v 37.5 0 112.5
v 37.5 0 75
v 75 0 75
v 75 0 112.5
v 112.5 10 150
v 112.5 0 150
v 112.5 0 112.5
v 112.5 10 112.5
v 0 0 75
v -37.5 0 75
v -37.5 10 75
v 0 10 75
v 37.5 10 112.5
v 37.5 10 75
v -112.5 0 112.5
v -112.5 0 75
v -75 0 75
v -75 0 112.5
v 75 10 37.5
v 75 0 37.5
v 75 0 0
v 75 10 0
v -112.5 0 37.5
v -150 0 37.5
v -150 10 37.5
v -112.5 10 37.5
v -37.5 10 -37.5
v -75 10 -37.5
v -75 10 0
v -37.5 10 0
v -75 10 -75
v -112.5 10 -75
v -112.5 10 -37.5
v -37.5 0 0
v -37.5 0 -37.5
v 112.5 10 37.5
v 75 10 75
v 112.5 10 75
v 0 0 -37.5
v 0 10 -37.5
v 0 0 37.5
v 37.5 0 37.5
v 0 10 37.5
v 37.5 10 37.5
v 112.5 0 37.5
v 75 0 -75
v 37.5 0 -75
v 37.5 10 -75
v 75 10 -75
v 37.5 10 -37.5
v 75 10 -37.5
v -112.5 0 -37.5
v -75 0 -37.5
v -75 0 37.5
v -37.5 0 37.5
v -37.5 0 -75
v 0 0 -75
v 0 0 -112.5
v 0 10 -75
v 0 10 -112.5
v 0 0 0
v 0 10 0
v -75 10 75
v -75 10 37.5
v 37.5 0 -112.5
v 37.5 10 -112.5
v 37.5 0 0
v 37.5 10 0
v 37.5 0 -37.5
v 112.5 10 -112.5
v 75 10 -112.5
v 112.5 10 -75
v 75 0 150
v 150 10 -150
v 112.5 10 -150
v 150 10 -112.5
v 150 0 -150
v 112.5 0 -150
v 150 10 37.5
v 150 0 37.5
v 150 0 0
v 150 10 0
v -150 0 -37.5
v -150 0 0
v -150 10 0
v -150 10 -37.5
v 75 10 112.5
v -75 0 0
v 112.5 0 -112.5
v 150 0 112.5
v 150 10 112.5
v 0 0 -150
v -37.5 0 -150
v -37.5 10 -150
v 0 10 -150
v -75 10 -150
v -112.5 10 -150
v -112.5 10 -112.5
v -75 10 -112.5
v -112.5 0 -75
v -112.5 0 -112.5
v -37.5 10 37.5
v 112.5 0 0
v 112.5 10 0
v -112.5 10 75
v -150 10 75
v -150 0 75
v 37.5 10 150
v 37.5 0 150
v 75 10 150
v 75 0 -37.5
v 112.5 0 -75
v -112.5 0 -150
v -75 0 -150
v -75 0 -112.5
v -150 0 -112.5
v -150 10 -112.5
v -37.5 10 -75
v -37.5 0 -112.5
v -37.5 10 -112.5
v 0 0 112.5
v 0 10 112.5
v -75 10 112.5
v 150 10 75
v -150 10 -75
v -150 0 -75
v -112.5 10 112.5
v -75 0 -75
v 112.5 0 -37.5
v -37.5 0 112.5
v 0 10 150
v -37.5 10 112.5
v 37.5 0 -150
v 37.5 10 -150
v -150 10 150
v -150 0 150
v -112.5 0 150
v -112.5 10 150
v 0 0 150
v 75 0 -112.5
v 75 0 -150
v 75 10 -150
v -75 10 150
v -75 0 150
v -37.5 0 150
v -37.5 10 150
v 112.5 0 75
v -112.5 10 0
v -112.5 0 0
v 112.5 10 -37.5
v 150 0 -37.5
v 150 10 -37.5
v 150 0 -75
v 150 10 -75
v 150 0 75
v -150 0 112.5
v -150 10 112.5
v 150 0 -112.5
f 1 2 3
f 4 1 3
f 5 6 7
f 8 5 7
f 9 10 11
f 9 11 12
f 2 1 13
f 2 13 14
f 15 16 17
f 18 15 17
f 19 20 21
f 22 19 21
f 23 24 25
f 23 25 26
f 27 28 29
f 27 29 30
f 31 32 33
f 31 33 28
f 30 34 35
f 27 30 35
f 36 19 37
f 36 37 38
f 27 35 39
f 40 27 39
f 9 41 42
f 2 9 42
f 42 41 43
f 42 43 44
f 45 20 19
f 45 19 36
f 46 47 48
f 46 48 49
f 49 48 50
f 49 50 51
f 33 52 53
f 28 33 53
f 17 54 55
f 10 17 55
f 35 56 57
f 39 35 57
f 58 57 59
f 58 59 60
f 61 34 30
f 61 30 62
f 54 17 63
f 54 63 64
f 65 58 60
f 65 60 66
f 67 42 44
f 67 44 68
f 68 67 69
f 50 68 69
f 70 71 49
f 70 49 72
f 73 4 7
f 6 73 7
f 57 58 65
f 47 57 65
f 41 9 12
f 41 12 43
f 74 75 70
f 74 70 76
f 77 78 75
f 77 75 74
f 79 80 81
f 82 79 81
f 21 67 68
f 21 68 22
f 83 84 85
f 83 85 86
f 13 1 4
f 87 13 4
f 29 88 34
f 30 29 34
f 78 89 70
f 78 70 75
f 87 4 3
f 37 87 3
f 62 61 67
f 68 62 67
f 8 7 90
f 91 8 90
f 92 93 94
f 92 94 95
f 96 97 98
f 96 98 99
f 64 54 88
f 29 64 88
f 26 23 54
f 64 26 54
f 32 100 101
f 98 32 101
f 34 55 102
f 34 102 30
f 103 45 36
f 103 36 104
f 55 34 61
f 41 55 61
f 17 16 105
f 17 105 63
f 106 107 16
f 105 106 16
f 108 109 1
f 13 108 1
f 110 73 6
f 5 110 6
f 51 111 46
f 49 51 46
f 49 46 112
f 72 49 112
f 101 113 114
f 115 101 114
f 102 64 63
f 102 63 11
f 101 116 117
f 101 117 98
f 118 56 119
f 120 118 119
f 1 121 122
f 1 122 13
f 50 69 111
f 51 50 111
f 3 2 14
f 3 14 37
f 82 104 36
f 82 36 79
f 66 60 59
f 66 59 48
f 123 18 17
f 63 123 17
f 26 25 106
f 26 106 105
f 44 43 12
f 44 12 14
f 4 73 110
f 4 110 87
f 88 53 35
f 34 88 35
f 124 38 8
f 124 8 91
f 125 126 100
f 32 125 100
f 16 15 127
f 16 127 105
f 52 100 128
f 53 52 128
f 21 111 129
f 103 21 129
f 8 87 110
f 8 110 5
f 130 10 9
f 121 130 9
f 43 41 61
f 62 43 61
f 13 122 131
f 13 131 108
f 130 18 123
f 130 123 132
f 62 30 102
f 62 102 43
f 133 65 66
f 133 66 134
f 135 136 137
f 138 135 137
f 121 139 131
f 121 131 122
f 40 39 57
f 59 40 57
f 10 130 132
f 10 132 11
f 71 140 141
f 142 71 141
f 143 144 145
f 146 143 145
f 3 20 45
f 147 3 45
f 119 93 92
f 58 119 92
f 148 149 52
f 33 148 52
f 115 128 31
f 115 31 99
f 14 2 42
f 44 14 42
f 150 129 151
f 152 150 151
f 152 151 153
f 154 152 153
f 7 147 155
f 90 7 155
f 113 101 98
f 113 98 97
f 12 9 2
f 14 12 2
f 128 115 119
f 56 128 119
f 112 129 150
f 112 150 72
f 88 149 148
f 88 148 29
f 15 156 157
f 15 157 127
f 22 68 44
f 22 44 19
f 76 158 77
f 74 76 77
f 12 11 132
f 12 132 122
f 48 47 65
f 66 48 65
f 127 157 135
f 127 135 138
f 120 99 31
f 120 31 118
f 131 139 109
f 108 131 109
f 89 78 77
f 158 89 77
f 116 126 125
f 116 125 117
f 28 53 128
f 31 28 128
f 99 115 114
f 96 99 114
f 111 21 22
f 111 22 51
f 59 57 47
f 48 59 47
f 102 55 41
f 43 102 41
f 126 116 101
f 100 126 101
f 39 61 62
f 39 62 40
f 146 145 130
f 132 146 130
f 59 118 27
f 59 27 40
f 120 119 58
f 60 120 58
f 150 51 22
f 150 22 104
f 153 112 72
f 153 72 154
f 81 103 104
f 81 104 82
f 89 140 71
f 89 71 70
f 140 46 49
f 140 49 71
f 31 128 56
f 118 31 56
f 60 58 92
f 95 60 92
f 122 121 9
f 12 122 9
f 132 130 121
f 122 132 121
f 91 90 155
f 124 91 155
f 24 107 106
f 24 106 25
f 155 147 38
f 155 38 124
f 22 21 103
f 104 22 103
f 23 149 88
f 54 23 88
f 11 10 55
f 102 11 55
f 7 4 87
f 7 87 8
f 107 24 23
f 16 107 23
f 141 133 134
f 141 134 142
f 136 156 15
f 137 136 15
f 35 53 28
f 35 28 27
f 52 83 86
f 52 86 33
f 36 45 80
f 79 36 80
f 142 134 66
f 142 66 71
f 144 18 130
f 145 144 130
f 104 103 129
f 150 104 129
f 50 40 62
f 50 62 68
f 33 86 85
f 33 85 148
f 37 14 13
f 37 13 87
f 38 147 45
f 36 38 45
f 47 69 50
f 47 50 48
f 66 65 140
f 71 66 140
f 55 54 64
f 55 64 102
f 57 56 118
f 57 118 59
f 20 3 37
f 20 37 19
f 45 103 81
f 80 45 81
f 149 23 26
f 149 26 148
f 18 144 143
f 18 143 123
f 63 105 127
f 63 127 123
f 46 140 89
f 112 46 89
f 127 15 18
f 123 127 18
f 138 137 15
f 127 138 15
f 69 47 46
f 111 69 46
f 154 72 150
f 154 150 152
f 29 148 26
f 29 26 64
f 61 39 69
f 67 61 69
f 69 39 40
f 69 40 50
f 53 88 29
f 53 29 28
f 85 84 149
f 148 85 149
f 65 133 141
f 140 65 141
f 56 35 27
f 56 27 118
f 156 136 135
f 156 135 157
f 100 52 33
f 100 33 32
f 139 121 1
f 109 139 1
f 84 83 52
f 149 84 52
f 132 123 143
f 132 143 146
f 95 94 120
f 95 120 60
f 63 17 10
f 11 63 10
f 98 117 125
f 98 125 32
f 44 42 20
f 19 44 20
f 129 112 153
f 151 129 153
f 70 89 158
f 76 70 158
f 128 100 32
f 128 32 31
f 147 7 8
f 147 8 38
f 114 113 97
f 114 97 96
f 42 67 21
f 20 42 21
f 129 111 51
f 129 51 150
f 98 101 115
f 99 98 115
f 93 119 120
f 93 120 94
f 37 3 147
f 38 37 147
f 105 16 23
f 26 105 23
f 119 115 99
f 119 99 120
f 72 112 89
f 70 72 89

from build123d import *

# Parameters (mm, degrees)
SKETCH1_W              = 37.5
SKETCH1_H              = 37.5
BOSS_EXTRUDE1_DEPTH    = 10
BOSS_EXTRUDE1_2_DEPTH  = 10
BOSS_EXTRUDE1_3_DEPTH  = 10
BOSS_EXTRUDE1_4_DEPTH  = 10
BOSS_EXTRUDE1_5_DEPTH  = 10
BOSS_EXTRUDE1_6_DEPTH  = 10
BOSS_EXTRUDE1_7_DEPTH  = 10
BOSS_EXTRUDE1_8_DEPTH  = 10
BOSS_EXTRUDE1_9_DEPTH  = 10
BOSS_EXTRUDE1_10_DEPTH = 10
BOSS_EXTRUDE1_11_DEPTH = 10
BOSS_EXTRUDE1_12_DEPTH = 10
BOSS_EXTRUDE1_13_DEPTH = 10
BOSS_EXTRUDE1_14_DEPTH = 10
BOSS_EXTRUDE1_15_DEPTH = 10
BOSS_EXTRUDE1_16_DEPTH = 10
BOSS_EXTRUDE1_17_DEPTH = 10
BOSS_EXTRUDE1_18_DEPTH = 10
BOSS_EXTRUDE1_19_DEPTH = 10
BOSS_EXTRUDE1_20_DEPTH = 10
BOSS_EXTRUDE1_21_DEPTH = 10
BOSS_EXTRUDE1_22_DEPTH = 10
BOSS_EXTRUDE1_23_DEPTH = 10
BOSS_EXTRUDE1_24_DEPTH = 10
BOSS_EXTRUDE1_25_DEPTH = 10
BOSS_EXTRUDE1_26_DEPTH = 10
BOSS_EXTRUDE1_27_DEPTH = 10
BOSS_EXTRUDE1_28_DEPTH = 10
BOSS_EXTRUDE1_29_DEPTH = 10
BOSS_EXTRUDE1_30_DEPTH = 10
BOSS_EXTRUDE1_31_DEPTH = 10
BOSS_EXTRUDE1_32_DEPTH = 10


with BuildPart() as part:
    # Sketch1 → Boss-Extrude1 (new body)
    with BuildSketch(Plane(origin=(0, 0, 0), x_dir=(1, 0, 0), z_dir=(0, 1, 0))):
        with Locations((-131.25, -131.25)):
            Rectangle(SKETCH1_W, SKETCH1_H)
    extrude(amount=BOSS_EXTRUDE1_DEPTH)


with BuildPart() as body_2:
    # Sketch1 → Boss-Extrude1 2 (new body)
    with BuildSketch(Plane(origin=(0, 0, 0), x_dir=(1, 0, 0), z_dir=(0, 1, 0))):
        with Locations((-56.25, -131.25)):
            Rectangle(SKETCH1_W, SKETCH1_H)
    extrude(amount=BOSS_EXTRUDE1_2_DEPTH)


with BuildPart() as body_3:
    # Sketch1 → Boss-Extrude1 3 (new body)
    with BuildSketch(Plane(origin=(0, 0, 0), x_dir=(1, 0, 0), z_dir=(0, 1, 0))):
        with Locations((18.75, -131.25)):
            Rectangle(SKETCH1_W, SKETCH1_H)
    extrude(amount=BOSS_EXTRUDE1_3_DEPTH)


with BuildPart() as body_4:
    # Sketch1 → Boss-Extrude1 4 (new body)
    with BuildSketch(Plane(origin=(0, 0, 0), x_dir=(1, 0, 0), z_dir=(0, 1, 0))):
        with Locations((93.75, -131.25)):
            Rectangle(SKETCH1_W, SKETCH1_H)
    extrude(amount=BOSS_EXTRUDE1_4_DEPTH)


with BuildPart() as body_5:
    # Sketch1 → Boss-Extrude1 5 (new body)
    with BuildSketch(Plane(origin=(0, 0, 0), x_dir=(1, 0, 0), z_dir=(0, 1, 0))):
        with Locations((131.25, -93.75)):
            Rectangle(SKETCH1_W, SKETCH1_H)
    extrude(amount=BOSS_EXTRUDE1_5_DEPTH)


with BuildPart() as body_6:
    # Sketch1 → Boss-Extrude1 6 (new body)
    with BuildSketch(Plane(origin=(0, 0, 0), x_dir=(1, 0, 0), z_dir=(0, 1, 0))):
        with Locations((131.25, -18.75)):
            Rectangle(SKETCH1_W, SKETCH1_H)
    extrude(amount=BOSS_EXTRUDE1_6_DEPTH)


with BuildPart() as body_7:
    # Sketch1 → Boss-Extrude1 7 (new body)
    with BuildSketch(Plane(origin=(0, 0, 0), x_dir=(1, 0, 0), z_dir=(0, 1, 0))):
        with Locations((131.25, 56.25)):
            Rectangle(SKETCH1_W, SKETCH1_H)
    extrude(amount=BOSS_EXTRUDE1_7_DEPTH)


with BuildPart() as body_8:
    # Sketch1 → Boss-Extrude1 8 (new body)
    with BuildSketch(Plane(origin=(0, 0, 0), x_dir=(1, 0, 0), z_dir=(0, 1, 0))):
        with Locations((131.25, 131.25)):
            Rectangle(SKETCH1_W, SKETCH1_H)
    extrude(amount=BOSS_EXTRUDE1_8_DEPTH)


with BuildPart() as body_9:
    # Sketch1 → Boss-Extrude1 9 (new body)
    with BuildSketch(Plane(origin=(0, 0, 0), x_dir=(1, 0, 0), z_dir=(0, 1, 0))):
        with Locations((93.75, 93.75)):
            Rectangle(SKETCH1_W, SKETCH1_H)
    extrude(amount=BOSS_EXTRUDE1_9_DEPTH)


with BuildPart() as body_10:
    # Sketch1 → Boss-Extrude1 10 (new body)
    with BuildSketch(Plane(origin=(0, 0, 0), x_dir=(1, 0, 0), z_dir=(0, 1, 0))):
        with Locations((93.75, 18.75)):
            Rectangle(SKETCH1_W, SKETCH1_H)
    extrude(amount=BOSS_EXTRUDE1_10_DEPTH)


with BuildPart() as body_11:
    # Sketch1 → Boss-Extrude1 11 (new body)
    with BuildSketch(Plane(origin=(0, 0, 0), x_dir=(1, 0, 0), z_dir=(0, 1, 0))):
        with Locations((93.75, -56.25)):
            Rectangle(SKETCH1_W, SKETCH1_H)
    extrude(amount=BOSS_EXTRUDE1_11_DEPTH)


with BuildPart() as body_12:
    # Sketch1 → Boss-Extrude1 12 (new body)
    with BuildSketch(Plane(origin=(0, 0, 0), x_dir=(1, 0, 0), z_dir=(0, 1, 0))):
        with Locations((56.25, -93.75)):
            Rectangle(SKETCH1_W, SKETCH1_H)
    extrude(amount=BOSS_EXTRUDE1_12_DEPTH)


with BuildPart() as body_13:
    # Sketch1 → Boss-Extrude1 13 (new body)
    with BuildSketch(Plane(origin=(0, 0, 0), x_dir=(1, 0, 0), z_dir=(0, 1, 0))):
        with Locations((56.25, -18.75)):
            Rectangle(SKETCH1_W, SKETCH1_H)
    extrude(amount=BOSS_EXTRUDE1_13_DEPTH)


with BuildPart() as body_14:
    # Sketch1 → Boss-Extrude1 14 (new body)
    with BuildSketch(Plane(origin=(0, 0, 0), x_dir=(1, 0, 0), z_dir=(0, 1, 0))):
        with Locations((56.25, 56.25)):
            Rectangle(SKETCH1_W, SKETCH1_H)
    extrude(amount=BOSS_EXTRUDE1_14_DEPTH)


with BuildPart() as body_15:
    # Sketch1 → Boss-Extrude1 15 (new body)
    with BuildSketch(Plane(origin=(0, 0, 0), x_dir=(1, 0, 0), z_dir=(0, 1, 0))):
        with Locations((56.25, 131.25)):
            Rectangle(SKETCH1_W, SKETCH1_H)
    extrude(amount=BOSS_EXTRUDE1_15_DEPTH)


with BuildPart() as body_16:
    # Sketch1 → Boss-Extrude1 16 (new body)
    with BuildSketch(Plane(origin=(0, 0, 0), x_dir=(1, 0, 0), z_dir=(0, 1, 0))):
        with Locations((18.75, 93.75)):
            Rectangle(SKETCH1_W, SKETCH1_H)
    extrude(amount=BOSS_EXTRUDE1_16_DEPTH)


with BuildPart() as body_17:
    # Sketch1 → Boss-Extrude1 17 (new body)
    with BuildSketch(Plane(origin=(0, 0, 0), x_dir=(1, 0, 0), z_dir=(0, 1, 0))):
        with Locations((18.75, 18.75)):
            Rectangle(SKETCH1_W, SKETCH1_H)
    extrude(amount=BOSS_EXTRUDE1_17_DEPTH)


with BuildPart() as body_18:
    # Sketch1 → Boss-Extrude1 18 (new body)
    with BuildSketch(Plane(origin=(0, 0, 0), x_dir=(1, 0, 0), z_dir=(0, 1, 0))):
        with Locations((18.75, -56.25)):
            Rectangle(SKETCH1_W, SKETCH1_H)
    extrude(amount=BOSS_EXTRUDE1_18_DEPTH)


with BuildPart() as body_19:
    # Sketch1 → Boss-Extrude1 19 (new body)
    with BuildSketch(Plane(origin=(0, 0, 0), x_dir=(1, 0, 0), z_dir=(0, 1, 0))):
        with Locations((-18.75, -93.75)):
            Rectangle(SKETCH1_W, SKETCH1_H)
    extrude(amount=BOSS_EXTRUDE1_19_DEPTH)


with BuildPart() as body_20:
    # Sketch1 → Boss-Extrude1 20 (new body)
    with BuildSketch(Plane(origin=(0, 0, 0), x_dir=(1, 0, 0), z_dir=(0, 1, 0))):
        with Locations((-18.75, -18.75)):
            Rectangle(SKETCH1_W, SKETCH1_H)
    extrude(amount=BOSS_EXTRUDE1_20_DEPTH)


with BuildPart() as body_21:
    # Sketch1 → Boss-Extrude1 21 (new body)
    with BuildSketch(Plane(origin=(0, 0, 0), x_dir=(1, 0, 0), z_dir=(0, 1, 0))):
        with Locations((-18.75, 56.25)):
            Rectangle(SKETCH1_W, SKETCH1_H)
    extrude(amount=BOSS_EXTRUDE1_21_DEPTH)


with BuildPart() as body_22:
    # Sketch1 → Boss-Extrude1 22 (new body)
    with BuildSketch(Plane(origin=(0, 0, 0), x_dir=(1, 0, 0), z_dir=(0, 1, 0))):
        with Locations((-18.75, 131.25)):
            Rectangle(SKETCH1_W, SKETCH1_H)
    extrude(amount=BOSS_EXTRUDE1_22_DEPTH)


with BuildPart() as body_23:
    # Sketch1 → Boss-Extrude1 23 (new body)
    with BuildSketch(Plane(origin=(0, 0, 0), x_dir=(1, 0, 0), z_dir=(0, 1, 0))):
        with Locations((-93.75, 131.25)):
            Rectangle(SKETCH1_W, SKETCH1_H)
    extrude(amount=BOSS_EXTRUDE1_23_DEPTH)


with BuildPart() as body_24:
    # Sketch1 → Boss-Extrude1 24 (new body)
    with BuildSketch(Plane(origin=(0, 0, 0), x_dir=(1, 0, 0), z_dir=(0, 1, 0))):
        with Locations((-131.25, 93.75)):
            Rectangle(SKETCH1_W, SKETCH1_H)
    extrude(amount=BOSS_EXTRUDE1_24_DEPTH)


with BuildPart() as body_25:
    # Sketch1 → Boss-Extrude1 25 (new body)
    with BuildSketch(Plane(origin=(0, 0, 0), x_dir=(1, 0, 0), z_dir=(0, 1, 0))):
        with Locations((-56.25, 93.75)):
            Rectangle(SKETCH1_W, SKETCH1_H)
    extrude(amount=BOSS_EXTRUDE1_25_DEPTH)


with BuildPart() as body_26:
    # Sketch1 → Boss-Extrude1 26 (new body)
    with BuildSketch(Plane(origin=(0, 0, 0), x_dir=(1, 0, 0), z_dir=(0, 1, 0))):
        with Locations((-93.75, 56.25)):
            Rectangle(SKETCH1_W, SKETCH1_H)
    extrude(amount=BOSS_EXTRUDE1_26_DEPTH)


with BuildPart() as body_27:
    # Sketch1 → Boss-Extrude1 27 (new body)
    with BuildSketch(Plane(origin=(0, 0, 0), x_dir=(1, 0, 0), z_dir=(0, 1, 0))):
        with Locations((-56.25, 18.75)):
            Rectangle(SKETCH1_W, SKETCH1_H)
    extrude(amount=BOSS_EXTRUDE1_27_DEPTH)


with BuildPart() as body_28:
    # Sketch1 → Boss-Extrude1 28 (new body)
    with BuildSketch(Plane(origin=(0, 0, 0), x_dir=(1, 0, 0), z_dir=(0, 1, 0))):
        with Locations((-131.25, 18.75)):
            Rectangle(SKETCH1_W, SKETCH1_H)
    extrude(amount=BOSS_EXTRUDE1_28_DEPTH)


with BuildPart() as body_29:
    # Sketch1 → Boss-Extrude1 29 (new body)
    with BuildSketch(Plane(origin=(0, 0, 0), x_dir=(1, 0, 0), z_dir=(0, 1, 0))):
        with Locations((-93.75, -18.75)):
            Rectangle(SKETCH1_W, SKETCH1_H)
    extrude(amount=BOSS_EXTRUDE1_29_DEPTH)


with BuildPart() as body_30:
    # Sketch1 → Boss-Extrude1 30 (new body)
    with BuildSketch(Plane(origin=(0, 0, 0), x_dir=(1, 0, 0), z_dir=(0, 1, 0))):
        with Locations((-131.25, -56.25)):
            Rectangle(SKETCH1_W, SKETCH1_H)
    extrude(amount=BOSS_EXTRUDE1_30_DEPTH)


with BuildPart() as body_31:
    # Sketch1 → Boss-Extrude1 31 (new body)
    with BuildSketch(Plane(origin=(0, 0, 0), x_dir=(1, 0, 0), z_dir=(0, 1, 0))):
        with Locations((-56.25, -56.25)):
            Rectangle(SKETCH1_W, SKETCH1_H)
    extrude(amount=BOSS_EXTRUDE1_31_DEPTH)


with BuildPart() as body_32:
    # Sketch1 → Boss-Extrude1 32 (new body)
    with BuildSketch(Plane(origin=(0, 0, 0), x_dir=(1, 0, 0), z_dir=(0, 1, 0))):
        with Locations((-93.75, -93.75)):
            Rectangle(SKETCH1_W, SKETCH1_H)
    extrude(amount=BOSS_EXTRUDE1_32_DEPTH)


solid = Compound([part.part, body_2.part, body_3.part, body_4.part, body_5.part, body_6.part, body_7.part, body_8.part, body_9.part, body_10.part, body_11.part, body_12.part, body_13.part, body_14.part, body_15.part, body_16.part, body_17.part, body_18.part, body_19.part, body_20.part, body_21.part, body_22.part, body_23.part, body_24.part, body_25.part, body_26.part, body_27.part, body_28.part, body_29.part, body_30.part, body_31.part, body_32.part])
